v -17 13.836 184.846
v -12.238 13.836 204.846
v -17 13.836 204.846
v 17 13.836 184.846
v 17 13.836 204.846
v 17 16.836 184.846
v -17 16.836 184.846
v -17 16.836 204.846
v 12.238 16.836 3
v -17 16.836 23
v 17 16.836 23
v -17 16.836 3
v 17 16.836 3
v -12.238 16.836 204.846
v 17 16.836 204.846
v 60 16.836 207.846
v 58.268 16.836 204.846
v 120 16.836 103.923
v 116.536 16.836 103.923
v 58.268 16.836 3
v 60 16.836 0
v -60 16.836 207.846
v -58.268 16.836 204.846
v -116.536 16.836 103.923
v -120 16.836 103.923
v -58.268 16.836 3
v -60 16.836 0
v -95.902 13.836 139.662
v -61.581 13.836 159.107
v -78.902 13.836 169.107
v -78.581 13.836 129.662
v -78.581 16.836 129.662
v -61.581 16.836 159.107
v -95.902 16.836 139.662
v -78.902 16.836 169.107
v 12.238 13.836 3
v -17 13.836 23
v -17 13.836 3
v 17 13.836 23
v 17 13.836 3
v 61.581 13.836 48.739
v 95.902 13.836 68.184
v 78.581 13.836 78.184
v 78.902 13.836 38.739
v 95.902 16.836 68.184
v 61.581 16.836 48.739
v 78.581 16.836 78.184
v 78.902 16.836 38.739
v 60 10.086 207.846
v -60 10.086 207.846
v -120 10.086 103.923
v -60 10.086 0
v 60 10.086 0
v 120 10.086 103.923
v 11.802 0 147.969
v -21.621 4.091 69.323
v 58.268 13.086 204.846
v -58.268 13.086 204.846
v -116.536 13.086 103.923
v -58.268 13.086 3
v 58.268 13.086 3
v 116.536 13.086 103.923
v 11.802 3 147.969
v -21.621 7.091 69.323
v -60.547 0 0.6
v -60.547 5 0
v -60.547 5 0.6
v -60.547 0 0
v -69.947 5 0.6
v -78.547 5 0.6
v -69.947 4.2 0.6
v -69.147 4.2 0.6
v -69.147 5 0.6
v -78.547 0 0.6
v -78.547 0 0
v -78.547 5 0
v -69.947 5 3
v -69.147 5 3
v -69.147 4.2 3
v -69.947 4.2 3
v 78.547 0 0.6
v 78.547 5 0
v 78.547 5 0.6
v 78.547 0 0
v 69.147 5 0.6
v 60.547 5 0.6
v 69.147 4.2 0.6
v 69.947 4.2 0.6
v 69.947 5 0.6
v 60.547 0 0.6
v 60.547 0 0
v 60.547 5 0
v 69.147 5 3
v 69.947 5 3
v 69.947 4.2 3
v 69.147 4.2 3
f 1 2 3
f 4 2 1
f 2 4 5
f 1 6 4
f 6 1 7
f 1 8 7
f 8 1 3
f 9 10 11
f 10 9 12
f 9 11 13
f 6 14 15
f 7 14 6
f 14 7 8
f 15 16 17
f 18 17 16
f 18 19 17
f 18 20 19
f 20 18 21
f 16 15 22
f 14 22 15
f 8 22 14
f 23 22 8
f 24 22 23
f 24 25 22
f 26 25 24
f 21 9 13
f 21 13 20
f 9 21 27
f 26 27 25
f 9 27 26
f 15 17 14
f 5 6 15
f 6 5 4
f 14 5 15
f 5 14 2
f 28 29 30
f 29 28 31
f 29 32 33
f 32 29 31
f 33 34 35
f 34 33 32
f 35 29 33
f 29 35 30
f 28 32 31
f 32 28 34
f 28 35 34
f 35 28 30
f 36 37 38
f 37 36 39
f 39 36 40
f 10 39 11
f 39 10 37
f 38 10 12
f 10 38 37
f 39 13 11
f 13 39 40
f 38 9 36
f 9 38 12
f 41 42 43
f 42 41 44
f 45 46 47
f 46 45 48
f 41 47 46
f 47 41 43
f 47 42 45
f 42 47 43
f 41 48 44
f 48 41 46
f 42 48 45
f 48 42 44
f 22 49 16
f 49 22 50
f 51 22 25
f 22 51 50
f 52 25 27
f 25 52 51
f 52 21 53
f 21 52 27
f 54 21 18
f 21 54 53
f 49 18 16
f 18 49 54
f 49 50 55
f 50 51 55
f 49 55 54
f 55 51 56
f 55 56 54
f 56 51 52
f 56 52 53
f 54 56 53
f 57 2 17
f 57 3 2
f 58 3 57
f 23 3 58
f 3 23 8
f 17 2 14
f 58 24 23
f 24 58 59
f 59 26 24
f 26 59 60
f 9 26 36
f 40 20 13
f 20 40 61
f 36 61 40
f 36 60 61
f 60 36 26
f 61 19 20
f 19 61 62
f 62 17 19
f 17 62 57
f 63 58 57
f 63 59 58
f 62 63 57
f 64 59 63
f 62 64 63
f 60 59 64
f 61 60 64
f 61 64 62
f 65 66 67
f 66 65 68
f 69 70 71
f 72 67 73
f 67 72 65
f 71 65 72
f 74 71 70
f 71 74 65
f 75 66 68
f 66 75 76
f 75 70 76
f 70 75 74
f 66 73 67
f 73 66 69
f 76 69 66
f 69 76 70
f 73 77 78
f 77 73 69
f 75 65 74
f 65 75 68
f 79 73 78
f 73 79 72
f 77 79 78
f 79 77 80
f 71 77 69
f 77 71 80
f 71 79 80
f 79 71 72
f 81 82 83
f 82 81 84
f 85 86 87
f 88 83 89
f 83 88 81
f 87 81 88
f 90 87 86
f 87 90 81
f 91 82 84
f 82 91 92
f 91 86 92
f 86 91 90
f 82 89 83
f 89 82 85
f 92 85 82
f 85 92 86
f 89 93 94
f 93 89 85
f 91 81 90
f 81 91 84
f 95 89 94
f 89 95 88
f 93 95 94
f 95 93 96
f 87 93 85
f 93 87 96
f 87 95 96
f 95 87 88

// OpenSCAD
/*
    parametric_faceted_hex_wall_tile_mount_v25_multi_plate_vertical.scad
    ----------------------------------------------------------------
    Regular asymmetric low-poly hex wall tile.

    v25 goals
    ---------
    1. Multi-object plate packing is the default design target.
    2. Preserve a TRUE regular hexagon -- no X/Y stretching.
    3. Default maximum corner-to-corner width = 240 mm / 9.449 in.
    4. Vertical export rests on a complete flat hex side, not a point.
    5. Open back remains fully open.
    6. Hidden mounting pads remain clipped below the visible face.
    7. One master thickness controls shell, perimeter, and pads.
    8. Integrated low-profile sacrificial stabilizer feet are enabled by default.
    9. Feet are intentionally shallow to improve multi-copy stability without
       consuming excessive plate depth.

    Recommended default
    -------------------
    face_size_reference      = "across_corners";
    face_size_units          = "mm";
    face_size                = 240.0;   // 9.449" maximum width

    tile_rotation_deg        = 15;

    export_orientation       = "vertical";
    vertical_edge_angle_deg  = 15;      // flat side on build plate

    master_thickness_mm      = 3.0;
    add_mount_pads           = true;
    add_mount_ribs           = false;

    // Multi-copy stability:
    add_vertical_breakaway_feet = true;
    vertical_foot_depth_mm       = 5.0;
    vertical_foot_height_mm      = 0.60;
    vertical_foot_neck_mm        = 0.80;

    Export
    ------
    F6 Render
    File -> Export -> Export as STL
*/


// =============================================================================
// CUSTOMIZER PARAMETERS
// =============================================================================


/* [Finished Face Size] */

// "bounding_square"
//     face_size is the maximum X and Y envelope.
//
// "flat_to_flat"
//     face_size is the traditional hex flat-to-flat dimension.
//
// "across_corners"
//     face_size is the regular-hex corner-to-corner dimension.
//
// v25 DEFAULT:
// across_corners = 240 mm so the vertically printed tile is about:
//     X = 240.0 mm
//     Z = 207.85 mm
// while resting on a complete flat edge.
face_size_reference = "across_corners"; // [bounding_square, flat_to_flat, across_corners]

// Units used by face_size.
face_size_units = "mm";                   // [mm, in]

// Default = 240 mm / 9.449 in maximum corner-to-corner width.
// This leaves useful X-axis margin on a 256 mm plate.
face_size = 240.0;

// Rotation of the finished hex within its face plane.
//
// IMPORTANT:
// 15 degrees gives a regular hex an equal X/Y bounding envelope.
// With bounding_square + 254 mm this produces approximately:
//     X = 254.0 mm
//     Y = 254.0 mm
tile_rotation_deg = 15;


/* [Export / Print Orientation] */

// "flat"     = conventional CAD orientation; decorative face points +Z.
// "vertical" = rotate final part onto an edge for vertical printing.
export_orientation = "vertical";          // [flat, vertical]

// Additional in-plane rotation used ONLY before standing the part vertically.
//
// IMPORTANT:
// The finished face uses tile_rotation_deg = 15 so its X/Y envelope is exactly
// square. A regular hex rests on a FLAT SIDE when its effective print-plane
// rotation is 30 degrees (modulo 60 degrees).
//
// Therefore the default vertical export adds another 15 degrees:
//
//     15 deg finished-face rotation
//   + 15 deg vertical export rotation
//   = 30 deg effective print rotation
//
// This puts a complete flat hex side on the build plate instead of a point.
// The transformed model is automatically translated so that side rests at Z=0.
// Rotate the finished 15-degree face orientation another 15 degrees before
// standing it up. 15 + 15 = 30 degrees, which places a complete hex side
// horizontally at the bottom rather than balancing the tile on a vertex.
vertical_edge_angle_deg = 15;

// Add small breakaway stabilizer feet after the model is stood vertically.
// Normally leave OFF and use a slicer brim if required.
add_vertical_breakaway_feet = true;

// Breakaway-foot dimensions.
vertical_foot_length_mm = 18.0;
vertical_foot_depth_mm = 5.0;
vertical_foot_height_mm = 0.60;
vertical_foot_neck_mm = 0.80;


/* [MASTER THICKNESS] */

// Main material thickness control.
master_thickness_mm = 3.0;

// Optional tuning multipliers.
front_shell_multiplier = 1.0;
perimeter_multiplier   = 1.0;
mount_pad_multiplier   = 1.0;


/* [Front Relief] */

// "proportional" scales relief with the true flat-to-flat dimension.
// "absolute" uses explicit millimeter values.
relief_height_mode = "proportional";      // [proportional, absolute]

relief_scale = 1.0;

// Relative relief proportions.
peak_height_ratio = 0.081;
ridge_to_peak_ratio = 0.757;
edge_to_peak_ratio = 0.097;

// Used only in absolute mode.
peak_height_mm   = 18.5;
ridge_height_mm = 14.0;
edge_height_mm  = 1.8;

// Minimum air gap between inner roof and mounting geometry.
edge_clearance_mm = 0.60;


/* [Facet Layout] */

peak_angle_deg = 45;
peak_radius_ratio = 0.38;

ridge_angle_deg = 208;
ridge_radius_ratio = 0.34;


/* [Wall Mounting] */

add_mount_pads = true;

// Width parallel to local hex edge.
mount_pad_width_mm = 34.0;

// Radial depth into the cavity.
mount_pad_depth_mm = 24.0;

// Structural overlap beneath the inner perimeter shell.
mount_pad_overlap_mm = 4.0;

// Pull mounting geometry inward from the visible outside perimeter.
mount_pad_edge_inset_mm = 3.0;

// Clearance below underside of visible face.
mount_face_clearance_mm = 0.75;

// Mount-pad directions in the tile's local coordinate system.
mount_pad_angles = [60, 120, 240, 300];


/* [Mount Reinforcement] */

add_mount_ribs = false;

mount_rib_width_mm  = 3.0;
mount_rib_height_mm = 5.0;
mount_rib_depth_mm  = 8.0;


/* [Optional Screw Holes] */

add_pad_screw_holes = false;

pad_screw_hole_diameter_mm = 4.5;



/* [Plate Packing Guidance] */

// These values do NOT duplicate objects inside the STL.
// They provide planning numbers in the OpenSCAD console for arranging
// multiple copies in the slicer.
//
// Typical X2D-style plate planning:
//   usable Y = 256 mm
//   keep a conservative front/rear margin
plate_depth_mm = 256.0;

plate_front_margin_mm = 8.0;
plate_rear_margin_mm  = 8.0;

// Recommended empty gap between adjacent standing tiles.
// Increase if using aggressive acceleration or if the printer has noticeable
// resonance/wobble on tall parts.
recommended_inter_tile_gap_mm = 8.0;

// Feet extend from Y=0 to vertical_foot_depth_mm.
// The actual tile relief occupies approximately peak_height in Y.
// Packing pitch uses whichever is deeper, plus the inter-tile gap.

/* [Advanced] */

polyhedron_convexity = 12;
screw_hole_fn = 40;

// Small numerical tolerance.
eps = 0.01;


// =============================================================================
// HELPERS
// =============================================================================

function polar(angle_deg, radius) =
    [
        radius * cos(angle_deg),
        radius * sin(angle_deg)
    ];

function hex_vertex_unrotated(i, radius) =
    [
        radius * cos(30 + i * 60),
        radius * sin(30 + i * 60)
    ];

function rotate2d(p, angle_deg) =
    [
        p[0] * cos(angle_deg) - p[1] * sin(angle_deg),
        p[0] * sin(angle_deg) + p[1] * cos(angle_deg)
    ];

function hex_vertex(i, radius) =
    rotate2d(
        hex_vertex_unrotated(i, radius),
        tile_rotation_deg
    );

// Half-width / half-height of a unit-circumradius rotated regular hex.
function unit_hex_half_x(rotation_deg) =
    max([
        for (i = [0 : 5])
            abs(
                cos(30 + i * 60 + rotation_deg)
            )
    ]);

function unit_hex_half_y(rotation_deg) =
    max([
        for (i = [0 : 5])
            abs(
                sin(30 + i * 60 + rotation_deg)
            )
    ]);

// Bounding box of a regular hex with circumradius r.
function hex_bbox_x(r, rotation_deg) =
    2 * r * unit_hex_half_x(rotation_deg);

function hex_bbox_y(r, rotation_deg) =
    2 * r * unit_hex_half_y(rotation_deg);


// =============================================================================
// DERIVED MATERIAL THICKNESSES
// =============================================================================

front_shell_thickness_mm =
    master_thickness_mm * front_shell_multiplier;

perimeter_wall_thickness_mm =
    master_thickness_mm * perimeter_multiplier;

mount_pad_thickness_mm =
    master_thickness_mm * mount_pad_multiplier;


// =============================================================================
// DERIVED FACE DIMENSIONS
// =============================================================================

_face_size_mm =
    face_size_units == "in"
        ? face_size * 25.4
        : face_size;

// If bounding_square is selected, choose the largest regular-hex radius that
// fits inside both the requested X and Y dimensions.
//
// At tile_rotation_deg = 15, unit X and Y extents are equal, so both dimensions
// become exactly face_size.
r_outer =
    face_size_reference == "flat_to_flat"
        ? (_face_size_mm / 2) / cos(30)
        : face_size_reference == "across_corners"
            ? _face_size_mm / 2
            : min(
                _face_size_mm / (2 * unit_hex_half_x(tile_rotation_deg)),
                _face_size_mm / (2 * unit_hex_half_y(tile_rotation_deg))
              );

tile_flat_to_flat =
    2 * r_outer * cos(30);

tile_across_corners =
    2 * r_outer;

finished_bbox_x =
    hex_bbox_x(r_outer, tile_rotation_deg);

finished_bbox_y =
    hex_bbox_y(r_outer, tile_rotation_deg);

outer_apothem =
    tile_flat_to_flat / 2;

inner_apothem =
    outer_apothem - perimeter_wall_thickness_mm;

r_inner =
    inner_apothem / cos(30);

inner_flat_length =
    2 * inner_apothem * tan(30);

hex_side_length =
    r_outer;


// =============================================================================
// DERIVED RELIEF HEIGHTS
// =============================================================================

_peak_unscaled =
    relief_height_mode == "proportional"
        ? tile_flat_to_flat * peak_height_ratio
        : peak_height_mm;

_ridge_unscaled =
    relief_height_mode == "proportional"
        ? _peak_unscaled * ridge_to_peak_ratio
        : ridge_height_mm;

_requested_edge_unscaled =
    relief_height_mode == "proportional"
        ? _peak_unscaled * edge_to_peak_ratio
        : edge_height_mm;

peak_height =
    _peak_unscaled * relief_scale;

ridge_height =
    _ridge_unscaled * relief_scale;

requested_edge_height =
    _requested_edge_unscaled * relief_scale;

// Enough vertical room for front shell + complete pad + clearance.
minimum_edge_height =
    front_shell_thickness_mm
    + mount_pad_thickness_mm
    + mount_face_clearance_mm;

edge_height =
    max(
        requested_edge_height,
        minimum_edge_height
    );


// =============================================================================
// DERIVED MOUNTING GEOMETRY
// =============================================================================

mount_pad_desired_outer_r =
    inner_apothem + mount_pad_overlap_mm;

mount_pad_inner_r =
    mount_pad_desired_outer_r - mount_pad_depth_mm;

mount_pad_center_r =
    mount_pad_desired_outer_r - mount_pad_depth_mm / 2;

mount_clip_apothem =
    outer_apothem - mount_pad_edge_inset_mm;

mount_clip_radius =
    mount_clip_apothem / cos(30);


// =============================================================================
// VERTICAL-EXPORT DERIVED VALUES
// =============================================================================
//
// The tile is first rotated around Z by vertical_edge_angle_deg, then stood up
// by +90 degrees around X.
//
// We calculate the local Y envelope AFTER that optional Z rotation so the
// final model can be translated to put its lowest point exactly on Z=0.

vertical_rotation_total_deg =
    vertical_edge_angle_deg;

vertical_half_y =
    max([
        for (i = [0 : 5])
            abs(
                r_outer
                * sin(
                    30
                    + i * 60
                    + tile_rotation_deg
                    + vertical_rotation_total_deg
                )
            )
    ]);

vertical_print_height =
    2 * vertical_half_y;

// After rotate([90,0,0]), original +Z becomes -Y.
// Translate by peak_height so all relief lies in positive Y.
vertical_print_depth =
    peak_height;

// Multi-copy packing envelope in Y.
//
// vertical_tile() occupies approximately peak_height of Y-depth.
// Breakaway feet occupy vertical_foot_depth_mm.
// Use the larger dimension as the per-part physical depth.
vertical_object_depth =
    max(
        vertical_print_depth,
        add_vertical_breakaway_feet ? vertical_foot_depth_mm : 0
    );

recommended_copy_pitch_y =
    vertical_object_depth + recommended_inter_tile_gap_mm;

usable_plate_depth =
    plate_depth_mm
    - plate_front_margin_mm
    - plate_rear_margin_mm;

estimated_copies_per_plate_depth =
    max(
        1,
        floor(
            (
                usable_plate_depth
                + recommended_inter_tile_gap_mm
            )
            / recommended_copy_pitch_y
        )
    );


// =============================================================================
// VALIDATION
// =============================================================================

assert(
    _face_size_mm > 0,
    "face_size must produce a positive dimension."
);

assert(
    master_thickness_mm > 0,
    "master_thickness_mm must be greater than zero."
);

assert(
    front_shell_multiplier > 0
    && perimeter_multiplier > 0
    && mount_pad_multiplier > 0,
    "All thickness multipliers must be greater than zero."
);

assert(
    front_shell_thickness_mm > 0,
    "front_shell_thickness_mm must be greater than zero."
);

assert(
    perimeter_wall_thickness_mm > 0,
    "perimeter_wall_thickness_mm must be greater than zero."
);

assert(
    perimeter_wall_thickness_mm < outer_apothem,
    "perimeter_wall_thickness_mm is too large for this tile."
);

assert(
    inner_apothem > 0,
    "The selected perimeter wall leaves no hollow interior."
);

assert(
    edge_height > front_shell_thickness_mm,
    "Internal error: edge_height must exceed front_shell_thickness_mm."
);

assert(
    ridge_height > edge_height,
    "ridge_height must remain greater than the effective edge height."
);

assert(
    peak_height > ridge_height,
    "peak_height must remain greater than ridge_height."
);

assert(
    peak_radius_ratio > 0 && peak_radius_ratio < 0.90,
    "peak_radius_ratio must be between 0 and 0.90."
);

assert(
    ridge_radius_ratio > 0 && ridge_radius_ratio < 0.90,
    "ridge_radius_ratio must be between 0 and 0.90."
);

assert(
    mount_pad_width_mm > 0,
    "mount_pad_width_mm must be greater than zero."
);

assert(
    mount_pad_depth_mm > 0,
    "mount_pad_depth_mm must be greater than zero."
);

assert(
    mount_pad_thickness_mm > 0,
    "mount_pad_thickness_mm must be greater than zero."
);

assert(
    mount_pad_overlap_mm >= 0,
    "mount_pad_overlap_mm cannot be negative."
);

assert(
    mount_pad_edge_inset_mm >= 0,
    "mount_pad_edge_inset_mm cannot be negative."
);

assert(
    mount_face_clearance_mm >= 0,
    "mount_face_clearance_mm cannot be negative."
);

assert(
    mount_clip_apothem > 0,
    "mount_pad_edge_inset_mm is too large."
);

assert(
    mount_pad_inner_r > 0,
    "mount_pad_depth_mm is too large and reaches/passes the tile center."
);

assert(
    !add_pad_screw_holes
    || pad_screw_hole_diameter_mm < mount_pad_width_mm * 0.75,
    "pad_screw_hole_diameter_mm is too large for the mounting pad."
);

assert(
    !add_mount_ribs
    || mount_rib_height_mm > 0,
    "mount_rib_height_mm must be greater than zero."
);

assert(
    !add_vertical_breakaway_feet
    || export_orientation == "vertical",
    "Vertical breakaway feet require export_orientation = \"vertical\"."
);

assert(
    plate_depth_mm > 0,
    "plate_depth_mm must be greater than zero."
);

assert(
    plate_front_margin_mm >= 0
    && plate_rear_margin_mm >= 0,
    "Plate margins cannot be negative."
);

assert(
    recommended_inter_tile_gap_mm >= 0,
    "recommended_inter_tile_gap_mm cannot be negative."
);

assert(
    usable_plate_depth > 0,
    "Plate margins leave no usable plate depth."
);


// =============================================================================
// DIAGNOSTIC OUTPUT
// =============================================================================

echo("====================================================");
echo("FACETED HEX WALL TILE v25 - MULTI-PLATE VERTICAL");
echo("====================================================");

echo(str("face size reference      : ", face_size_reference));
echo(str("requested face size      : ", _face_size_mm, " mm"));
echo(str("tile rotation            : ", tile_rotation_deg, " deg"));

echo(str("finished bbox X          : ", finished_bbox_x, " mm"));
echo(str("finished bbox Y          : ", finished_bbox_y, " mm"));
echo(str("finished bbox X inches   : ", finished_bbox_x / 25.4, " in"));
echo(str("finished bbox Y inches   : ", finished_bbox_y / 25.4, " in"));

echo(str("flat-to-flat             : ", tile_flat_to_flat, " mm"));
echo(str("across-corners           : ", tile_across_corners, " mm"));
echo(str("hex side length          : ", hex_side_length, " mm"));

echo(str("MASTER thickness         : ", master_thickness_mm, " mm"));
echo(str("actual front shell       : ", front_shell_thickness_mm, " mm"));
echo(str("actual perimeter wall    : ", perimeter_wall_thickness_mm, " mm"));
echo(str("actual mount pad         : ", mount_pad_thickness_mm, " mm"));

echo(str("requested edge height    : ", requested_edge_height, " mm"));
echo(str("minimum edge height      : ", minimum_edge_height, " mm"));
echo(str("EFFECTIVE edge height    : ", edge_height, " mm"));

echo(str("ridge height             : ", ridge_height, " mm"));
echo(str("peak height              : ", peak_height, " mm"));
echo(str("peak height inches       : ", peak_height / 25.4, " in"));

echo(str("mount pad width          : ", mount_pad_width_mm, " mm"));
echo(str("mount pad depth          : ", mount_pad_depth_mm, " mm"));
echo(str("mount pad thickness      : ", mount_pad_thickness_mm, " mm"));
echo(str("mount pad overlap        : ", mount_pad_overlap_mm, " mm"));
echo(str("mount edge inset         : ", mount_pad_edge_inset_mm, " mm"));
echo(str("mount/face clearance     : ", mount_face_clearance_mm, " mm"));

echo(str("export orientation       : ", export_orientation));
echo(str("vertical extra rotation  : ", vertical_edge_angle_deg, " deg"));
echo(str("effective print rotation : ",
         tile_rotation_deg + vertical_edge_angle_deg, " deg"));

if (export_orientation == "vertical"
    && abs(
        ((tile_rotation_deg + vertical_edge_angle_deg) % 60) - 30
    ) < 0.001)
    echo("build-plate contact      : FLAT HEX SIDE");
else if (export_orientation == "vertical")
    echo("build-plate contact      : WARNING - NOT EXACTLY FLAT-SIDE DOWN");

if (export_orientation == "vertical") {
    echo(str("vertical print height    : ", vertical_print_height, " mm"));
    echo(str("vertical relief depth    : ", vertical_print_depth, " mm"));
    echo(str("vertical object depth    : ", vertical_object_depth, " mm"));
    echo(str("recommended Y gap        : ", recommended_inter_tile_gap_mm, " mm"));
    echo(str("recommended Y pitch      : ", recommended_copy_pitch_y, " mm"));
    echo(str("usable plate Y depth     : ", usable_plate_depth, " mm"));
    echo(str("estimated copies in Y    : ", estimated_copies_per_plate_depth));
}

if (edge_height > requested_edge_height)
    echo(
        str(
            "AUTO EDGE FIX ACTIVE: edge raised from ",
            requested_edge_height,
            " mm to ",
            edge_height,
            " mm."
        )
    );

echo("====================================================");


// =============================================================================
// FRONT RELIEF CONTROL POINTS
// =============================================================================

P_xy =
    polar(
        peak_angle_deg + tile_rotation_deg,
        r_outer * peak_radius_ratio
    );

Q_xy =
    polar(
        ridge_angle_deg + tile_rotation_deg,
        r_outer * ridge_radius_ratio
    );


// =============================================================================
// SHELL VERTICES
// =============================================================================

points =
    concat(

        // 0..5 : outer rear perimeter
        [
            for (i = [0 : 5])
                let(p = hex_vertex(i, r_outer))
                [p[0], p[1], 0]
        ],

        // 6..11 : outer front perimeter
        [
            for (i = [0 : 5])
                let(p = hex_vertex(i, r_outer))
                [p[0], p[1], edge_height]
        ],

        // 12..13 : outer peak / ridge
        [
            [P_xy[0], P_xy[1], peak_height],
            [Q_xy[0], Q_xy[1], ridge_height]
        ],

        // 14..19 : inner rear perimeter
        [
            for (i = [0 : 5])
                let(p = hex_vertex(i, r_inner))
                [p[0], p[1], 0]
        ],

        // 20..25 : inner front perimeter
        [
            for (i = [0 : 5])
                let(p = hex_vertex(i, r_inner))
                [p[0], p[1], edge_height - front_shell_thickness_mm]
        ],

        // 26..27 : inner peak / ridge
        [
            [
                P_xy[0],
                P_xy[1],
                peak_height - front_shell_thickness_mm
            ],
            [
                Q_xy[0],
                Q_xy[1],
                ridge_height - front_shell_thickness_mm
            ]
        ]
    );


// =============================================================================
// SHELL FACES
// =============================================================================

outer_roof_faces = [
    [6, 7, 12],
    [7, 8, 12],
    [6, 12, 11],

    [8, 13, 12],
    [11, 12, 13],

    [8, 9, 13],
    [9, 10, 13],
    [10, 11, 13]
];

inner_roof_faces = [
    [26, 21, 20],
    [26, 22, 21],
    [25, 26, 20],

    [26, 27, 22],
    [27, 26, 25],

    [27, 23, 22],
    [27, 24, 23],
    [27, 25, 24]
];

faces =
    concat(

        // Outer vertical perimeter
        [
            for (i = [0 : 5])
                [
                    i,
                    (i + 1) % 6,
                    6 + (i + 1) % 6,
                    6 + i
                ]
        ],

        outer_roof_faces,

        // Inner vertical perimeter
        [
            for (i = [0 : 5])
                [
                    14 + i,
                    20 + i,
                    20 + (i + 1) % 6,
                    14 + (i + 1) % 6
                ]
        ],

        inner_roof_faces,

        // Narrow rear perimeter ring only.
        // Center remains fully open.
        [
            for (i = [0 : 5])
                [
                    i,
                    14 + i,
                    14 + (i + 1) % 6,
                    (i + 1) % 6
                ]
        ]
    );


// =============================================================================
// TILE SHELL
// =============================================================================

module tile_shell() {
    polyhedron(
        points = points,
        faces = faces,
        convexity = polyhedron_convexity
    );
}


// =============================================================================
// SAFE MOUNTING VOLUME BELOW FRONT FACE
// =============================================================================

safe_edge_z =
    max(
        eps,
        edge_height
        - front_shell_thickness_mm
        - mount_face_clearance_mm
    );

safe_peak_z =
    max(
        eps,
        peak_height
        - front_shell_thickness_mm
        - mount_face_clearance_mm
    );

safe_ridge_z =
    max(
        eps,
        ridge_height
        - front_shell_thickness_mm
        - mount_face_clearance_mm
    );

safe_mount_points =
    concat(

        // 0..5 : rear outer perimeter
        [
            for (i = [0 : 5])
                let(p = hex_vertex(i, r_outer))
                [p[0], p[1], 0]
        ],

        // 6..11 : safe ceiling at outer perimeter
        [
            for (i = [0 : 5])
                let(p = hex_vertex(i, r_outer))
                [p[0], p[1], safe_edge_z]
        ],

        // 12..13 : safe ceiling under peak/ridge
        [
            [P_xy[0], P_xy[1], safe_peak_z],
            [Q_xy[0], Q_xy[1], safe_ridge_z]
        ]
    );

safe_mount_ceiling_faces = [
    [6, 7, 12],
    [7, 8, 12],
    [6, 12, 11],
    [8, 13, 12],
    [11, 12, 13],
    [8, 9, 13],
    [9, 10, 13],
    [10, 11, 13]
];

safe_mount_faces =
    concat(

        // Outer side walls.
        [
            for (i = [0 : 5])
                [
                    i,
                    (i + 1) % 6,
                    6 + (i + 1) % 6,
                    6 + i
                ]
        ],

        // Sloped safe ceiling.
        safe_mount_ceiling_faces,

        // Rear floor used only to close clipping volume.
        [[5, 4, 3, 2, 1, 0]]
    );

module safe_mount_volume() {
    polyhedron(
        points = safe_mount_points,
        faces = safe_mount_faces,
        convexity = polyhedron_convexity
    );
}


// =============================================================================
// HEX FOOTPRINT FOR MOUNT CLIPPING
// =============================================================================

module mount_clip_volume(height_mm) {
    linear_extrude(height = height_mm)
        polygon(
            points = [
                for (i = [0 : 5])
                    hex_vertex(i, mount_clip_radius)
            ]
        );
}


// =============================================================================
// RAW MOUNT PAD
// =============================================================================
//
// Mount-pad angles are local tile angles. tile_rotation_deg is applied so the
// pads remain attached to the same visual positions when the face rotates.

module raw_mount_pad(angle_deg) {
    rotate([0, 0, angle_deg + tile_rotation_deg])
        translate(
            [
                mount_pad_inner_r,
                -mount_pad_width_mm / 2,
                0
            ]
        )
            cube(
                [
                    mount_pad_depth_mm,
                    mount_pad_width_mm,
                    mount_pad_thickness_mm
                ]
            );
}


// =============================================================================
// CLIPPED MOUNT PAD
// =============================================================================

module mount_pad(angle_deg) {
    intersection() {

        raw_mount_pad(angle_deg);

        // Keep pad inside inset hex footprint.
        mount_clip_volume(
            mount_pad_thickness_mm + eps
        );

        // Hard stop below underside of front shell.
        safe_mount_volume();
    }
}


// =============================================================================
// OPTIONAL REINFORCING RIBS
// =============================================================================

module raw_mount_ribs(angle_deg) {

    rib_center_r =
        mount_pad_desired_outer_r
        - mount_rib_depth_mm / 2;

    rib_side_offset =
        max(
            0,
            mount_pad_width_mm / 2
            - mount_rib_width_mm
            - 2
        );

    rotate([0, 0, angle_deg + tile_rotation_deg]) {

        for (side = [-1, 1]) {

            translate(
                [
                    rib_center_r - mount_rib_depth_mm / 2,
                    side * rib_side_offset - mount_rib_width_mm / 2,
                    mount_pad_thickness_mm
                ]
            )

            rotate([90, 0, 90])

            linear_extrude(height = mount_rib_depth_mm)

            polygon(
                points = [
                    [0, 0],
                    [mount_rib_width_mm, 0],
                    [mount_rib_width_mm, mount_rib_height_mm],
                    [0, 0]
                ]
            );
        }
    }
}

module mount_ribs(angle_deg) {
    intersection() {

        raw_mount_ribs(angle_deg);

        mount_clip_volume(
            mount_pad_thickness_mm
            + mount_rib_height_mm
            + 0.1
        );

        safe_mount_volume();
    }
}


// =============================================================================
// OPTIONAL SCREW HOLE
// =============================================================================

module pad_screw_hole(angle_deg) {

    rotate([0, 0, angle_deg + tile_rotation_deg])

        translate(
            [
                mount_pad_center_r,
                0,
                -1
            ]
        )

            cylinder(
                d = pad_screw_hole_diameter_mm,
                h =
                    mount_pad_thickness_mm
                    + mount_rib_height_mm
                    + 2,
                $fn = screw_hole_fn
            );
}


// =============================================================================
// COMPLETE FINISHED TILE
// =============================================================================

module finished_tile() {

    difference() {

        union() {

            tile_shell();

            if (add_mount_pads) {

                for (a = mount_pad_angles) {

                    mount_pad(a);

                    if (add_mount_ribs)
                        mount_ribs(a);
                }
            }
        }

        if (
            add_mount_pads
            && add_pad_screw_holes
        ) {

            for (a = mount_pad_angles)
                pad_screw_hole(a);
        }
    }
}


// =============================================================================
// VERTICAL-PRINT TRANSFORM
// =============================================================================
//
// Transform order in OpenSCAD is inside-out:
//
// 1. finished_tile()
// 2. optional extra Z rotation for selecting another edge
// 3. rotate +90 degrees around X so the face stands vertically
// 4. translate so:
//      - relief depth occupies positive Y
//      - lowest tile point is exactly at Z=0

module vertical_tile() {

    translate(
        [
            0,
            peak_height,
            vertical_half_y
        ]
    )

    rotate([90, 0, 0])

    rotate([0, 0, vertical_edge_angle_deg])

        finished_tile();
}


// =============================================================================
// OPTIONAL BREAKAWAY VERTICAL FEET
// =============================================================================
//
// These are intentionally simple sacrificial tabs.
// They are added only in vertical export mode.
// Leave OFF unless a brim alone is not sufficient.

module vertical_breakaway_feet() {

    // Two shallow stabilizer tabs, one near each side of the lower contact edge.
    //
    // The stood-up tile lies approximately from Y=0 to Y=peak_height.
    // These feet extend across the shallow back-side region only, keeping the
    // packing depth low while widening the build-plate contact patch.

    foot_x =
        finished_bbox_x * 0.30;

    for (x = [-foot_x, foot_x]) {

        // Main sacrificial foot.
        translate(
            [
                x - vertical_foot_length_mm / 2,
                0,
                0
            ]
        )
            cube(
                [
                    vertical_foot_length_mm,
                    vertical_foot_depth_mm,
                    vertical_foot_height_mm
                ]
            );

        // Narrow breakaway neck.
        translate(
            [
                x - vertical_foot_neck_mm / 2,
                vertical_foot_depth_mm - vertical_foot_neck_mm,
                0
            ]
        )
            cube(
                [
                    vertical_foot_neck_mm,
                    vertical_foot_neck_mm,
                    min(edge_height, 3.0)
                ]
            );
    }
}


// =============================================================================
// OUTPUT
// =============================================================================
//
// Default v25 exported STL target:
//   X ~ 240.00 mm  / 9.449 in
//   Y ~ relief depth (~17-19 mm depending on relief settings)
//   Z ~ 207.85 mm  / 8.183 in
//
// Multiple copies should be duplicated and arrayed along Y in the slicer.

module output_model() {

    if (export_orientation == "vertical") {

        union() {

            vertical_tile();

            if (add_vertical_breakaway_feet)
                vertical_breakaway_feet();
        }

    } else {

        finished_tile();
    }
}

output_model();
